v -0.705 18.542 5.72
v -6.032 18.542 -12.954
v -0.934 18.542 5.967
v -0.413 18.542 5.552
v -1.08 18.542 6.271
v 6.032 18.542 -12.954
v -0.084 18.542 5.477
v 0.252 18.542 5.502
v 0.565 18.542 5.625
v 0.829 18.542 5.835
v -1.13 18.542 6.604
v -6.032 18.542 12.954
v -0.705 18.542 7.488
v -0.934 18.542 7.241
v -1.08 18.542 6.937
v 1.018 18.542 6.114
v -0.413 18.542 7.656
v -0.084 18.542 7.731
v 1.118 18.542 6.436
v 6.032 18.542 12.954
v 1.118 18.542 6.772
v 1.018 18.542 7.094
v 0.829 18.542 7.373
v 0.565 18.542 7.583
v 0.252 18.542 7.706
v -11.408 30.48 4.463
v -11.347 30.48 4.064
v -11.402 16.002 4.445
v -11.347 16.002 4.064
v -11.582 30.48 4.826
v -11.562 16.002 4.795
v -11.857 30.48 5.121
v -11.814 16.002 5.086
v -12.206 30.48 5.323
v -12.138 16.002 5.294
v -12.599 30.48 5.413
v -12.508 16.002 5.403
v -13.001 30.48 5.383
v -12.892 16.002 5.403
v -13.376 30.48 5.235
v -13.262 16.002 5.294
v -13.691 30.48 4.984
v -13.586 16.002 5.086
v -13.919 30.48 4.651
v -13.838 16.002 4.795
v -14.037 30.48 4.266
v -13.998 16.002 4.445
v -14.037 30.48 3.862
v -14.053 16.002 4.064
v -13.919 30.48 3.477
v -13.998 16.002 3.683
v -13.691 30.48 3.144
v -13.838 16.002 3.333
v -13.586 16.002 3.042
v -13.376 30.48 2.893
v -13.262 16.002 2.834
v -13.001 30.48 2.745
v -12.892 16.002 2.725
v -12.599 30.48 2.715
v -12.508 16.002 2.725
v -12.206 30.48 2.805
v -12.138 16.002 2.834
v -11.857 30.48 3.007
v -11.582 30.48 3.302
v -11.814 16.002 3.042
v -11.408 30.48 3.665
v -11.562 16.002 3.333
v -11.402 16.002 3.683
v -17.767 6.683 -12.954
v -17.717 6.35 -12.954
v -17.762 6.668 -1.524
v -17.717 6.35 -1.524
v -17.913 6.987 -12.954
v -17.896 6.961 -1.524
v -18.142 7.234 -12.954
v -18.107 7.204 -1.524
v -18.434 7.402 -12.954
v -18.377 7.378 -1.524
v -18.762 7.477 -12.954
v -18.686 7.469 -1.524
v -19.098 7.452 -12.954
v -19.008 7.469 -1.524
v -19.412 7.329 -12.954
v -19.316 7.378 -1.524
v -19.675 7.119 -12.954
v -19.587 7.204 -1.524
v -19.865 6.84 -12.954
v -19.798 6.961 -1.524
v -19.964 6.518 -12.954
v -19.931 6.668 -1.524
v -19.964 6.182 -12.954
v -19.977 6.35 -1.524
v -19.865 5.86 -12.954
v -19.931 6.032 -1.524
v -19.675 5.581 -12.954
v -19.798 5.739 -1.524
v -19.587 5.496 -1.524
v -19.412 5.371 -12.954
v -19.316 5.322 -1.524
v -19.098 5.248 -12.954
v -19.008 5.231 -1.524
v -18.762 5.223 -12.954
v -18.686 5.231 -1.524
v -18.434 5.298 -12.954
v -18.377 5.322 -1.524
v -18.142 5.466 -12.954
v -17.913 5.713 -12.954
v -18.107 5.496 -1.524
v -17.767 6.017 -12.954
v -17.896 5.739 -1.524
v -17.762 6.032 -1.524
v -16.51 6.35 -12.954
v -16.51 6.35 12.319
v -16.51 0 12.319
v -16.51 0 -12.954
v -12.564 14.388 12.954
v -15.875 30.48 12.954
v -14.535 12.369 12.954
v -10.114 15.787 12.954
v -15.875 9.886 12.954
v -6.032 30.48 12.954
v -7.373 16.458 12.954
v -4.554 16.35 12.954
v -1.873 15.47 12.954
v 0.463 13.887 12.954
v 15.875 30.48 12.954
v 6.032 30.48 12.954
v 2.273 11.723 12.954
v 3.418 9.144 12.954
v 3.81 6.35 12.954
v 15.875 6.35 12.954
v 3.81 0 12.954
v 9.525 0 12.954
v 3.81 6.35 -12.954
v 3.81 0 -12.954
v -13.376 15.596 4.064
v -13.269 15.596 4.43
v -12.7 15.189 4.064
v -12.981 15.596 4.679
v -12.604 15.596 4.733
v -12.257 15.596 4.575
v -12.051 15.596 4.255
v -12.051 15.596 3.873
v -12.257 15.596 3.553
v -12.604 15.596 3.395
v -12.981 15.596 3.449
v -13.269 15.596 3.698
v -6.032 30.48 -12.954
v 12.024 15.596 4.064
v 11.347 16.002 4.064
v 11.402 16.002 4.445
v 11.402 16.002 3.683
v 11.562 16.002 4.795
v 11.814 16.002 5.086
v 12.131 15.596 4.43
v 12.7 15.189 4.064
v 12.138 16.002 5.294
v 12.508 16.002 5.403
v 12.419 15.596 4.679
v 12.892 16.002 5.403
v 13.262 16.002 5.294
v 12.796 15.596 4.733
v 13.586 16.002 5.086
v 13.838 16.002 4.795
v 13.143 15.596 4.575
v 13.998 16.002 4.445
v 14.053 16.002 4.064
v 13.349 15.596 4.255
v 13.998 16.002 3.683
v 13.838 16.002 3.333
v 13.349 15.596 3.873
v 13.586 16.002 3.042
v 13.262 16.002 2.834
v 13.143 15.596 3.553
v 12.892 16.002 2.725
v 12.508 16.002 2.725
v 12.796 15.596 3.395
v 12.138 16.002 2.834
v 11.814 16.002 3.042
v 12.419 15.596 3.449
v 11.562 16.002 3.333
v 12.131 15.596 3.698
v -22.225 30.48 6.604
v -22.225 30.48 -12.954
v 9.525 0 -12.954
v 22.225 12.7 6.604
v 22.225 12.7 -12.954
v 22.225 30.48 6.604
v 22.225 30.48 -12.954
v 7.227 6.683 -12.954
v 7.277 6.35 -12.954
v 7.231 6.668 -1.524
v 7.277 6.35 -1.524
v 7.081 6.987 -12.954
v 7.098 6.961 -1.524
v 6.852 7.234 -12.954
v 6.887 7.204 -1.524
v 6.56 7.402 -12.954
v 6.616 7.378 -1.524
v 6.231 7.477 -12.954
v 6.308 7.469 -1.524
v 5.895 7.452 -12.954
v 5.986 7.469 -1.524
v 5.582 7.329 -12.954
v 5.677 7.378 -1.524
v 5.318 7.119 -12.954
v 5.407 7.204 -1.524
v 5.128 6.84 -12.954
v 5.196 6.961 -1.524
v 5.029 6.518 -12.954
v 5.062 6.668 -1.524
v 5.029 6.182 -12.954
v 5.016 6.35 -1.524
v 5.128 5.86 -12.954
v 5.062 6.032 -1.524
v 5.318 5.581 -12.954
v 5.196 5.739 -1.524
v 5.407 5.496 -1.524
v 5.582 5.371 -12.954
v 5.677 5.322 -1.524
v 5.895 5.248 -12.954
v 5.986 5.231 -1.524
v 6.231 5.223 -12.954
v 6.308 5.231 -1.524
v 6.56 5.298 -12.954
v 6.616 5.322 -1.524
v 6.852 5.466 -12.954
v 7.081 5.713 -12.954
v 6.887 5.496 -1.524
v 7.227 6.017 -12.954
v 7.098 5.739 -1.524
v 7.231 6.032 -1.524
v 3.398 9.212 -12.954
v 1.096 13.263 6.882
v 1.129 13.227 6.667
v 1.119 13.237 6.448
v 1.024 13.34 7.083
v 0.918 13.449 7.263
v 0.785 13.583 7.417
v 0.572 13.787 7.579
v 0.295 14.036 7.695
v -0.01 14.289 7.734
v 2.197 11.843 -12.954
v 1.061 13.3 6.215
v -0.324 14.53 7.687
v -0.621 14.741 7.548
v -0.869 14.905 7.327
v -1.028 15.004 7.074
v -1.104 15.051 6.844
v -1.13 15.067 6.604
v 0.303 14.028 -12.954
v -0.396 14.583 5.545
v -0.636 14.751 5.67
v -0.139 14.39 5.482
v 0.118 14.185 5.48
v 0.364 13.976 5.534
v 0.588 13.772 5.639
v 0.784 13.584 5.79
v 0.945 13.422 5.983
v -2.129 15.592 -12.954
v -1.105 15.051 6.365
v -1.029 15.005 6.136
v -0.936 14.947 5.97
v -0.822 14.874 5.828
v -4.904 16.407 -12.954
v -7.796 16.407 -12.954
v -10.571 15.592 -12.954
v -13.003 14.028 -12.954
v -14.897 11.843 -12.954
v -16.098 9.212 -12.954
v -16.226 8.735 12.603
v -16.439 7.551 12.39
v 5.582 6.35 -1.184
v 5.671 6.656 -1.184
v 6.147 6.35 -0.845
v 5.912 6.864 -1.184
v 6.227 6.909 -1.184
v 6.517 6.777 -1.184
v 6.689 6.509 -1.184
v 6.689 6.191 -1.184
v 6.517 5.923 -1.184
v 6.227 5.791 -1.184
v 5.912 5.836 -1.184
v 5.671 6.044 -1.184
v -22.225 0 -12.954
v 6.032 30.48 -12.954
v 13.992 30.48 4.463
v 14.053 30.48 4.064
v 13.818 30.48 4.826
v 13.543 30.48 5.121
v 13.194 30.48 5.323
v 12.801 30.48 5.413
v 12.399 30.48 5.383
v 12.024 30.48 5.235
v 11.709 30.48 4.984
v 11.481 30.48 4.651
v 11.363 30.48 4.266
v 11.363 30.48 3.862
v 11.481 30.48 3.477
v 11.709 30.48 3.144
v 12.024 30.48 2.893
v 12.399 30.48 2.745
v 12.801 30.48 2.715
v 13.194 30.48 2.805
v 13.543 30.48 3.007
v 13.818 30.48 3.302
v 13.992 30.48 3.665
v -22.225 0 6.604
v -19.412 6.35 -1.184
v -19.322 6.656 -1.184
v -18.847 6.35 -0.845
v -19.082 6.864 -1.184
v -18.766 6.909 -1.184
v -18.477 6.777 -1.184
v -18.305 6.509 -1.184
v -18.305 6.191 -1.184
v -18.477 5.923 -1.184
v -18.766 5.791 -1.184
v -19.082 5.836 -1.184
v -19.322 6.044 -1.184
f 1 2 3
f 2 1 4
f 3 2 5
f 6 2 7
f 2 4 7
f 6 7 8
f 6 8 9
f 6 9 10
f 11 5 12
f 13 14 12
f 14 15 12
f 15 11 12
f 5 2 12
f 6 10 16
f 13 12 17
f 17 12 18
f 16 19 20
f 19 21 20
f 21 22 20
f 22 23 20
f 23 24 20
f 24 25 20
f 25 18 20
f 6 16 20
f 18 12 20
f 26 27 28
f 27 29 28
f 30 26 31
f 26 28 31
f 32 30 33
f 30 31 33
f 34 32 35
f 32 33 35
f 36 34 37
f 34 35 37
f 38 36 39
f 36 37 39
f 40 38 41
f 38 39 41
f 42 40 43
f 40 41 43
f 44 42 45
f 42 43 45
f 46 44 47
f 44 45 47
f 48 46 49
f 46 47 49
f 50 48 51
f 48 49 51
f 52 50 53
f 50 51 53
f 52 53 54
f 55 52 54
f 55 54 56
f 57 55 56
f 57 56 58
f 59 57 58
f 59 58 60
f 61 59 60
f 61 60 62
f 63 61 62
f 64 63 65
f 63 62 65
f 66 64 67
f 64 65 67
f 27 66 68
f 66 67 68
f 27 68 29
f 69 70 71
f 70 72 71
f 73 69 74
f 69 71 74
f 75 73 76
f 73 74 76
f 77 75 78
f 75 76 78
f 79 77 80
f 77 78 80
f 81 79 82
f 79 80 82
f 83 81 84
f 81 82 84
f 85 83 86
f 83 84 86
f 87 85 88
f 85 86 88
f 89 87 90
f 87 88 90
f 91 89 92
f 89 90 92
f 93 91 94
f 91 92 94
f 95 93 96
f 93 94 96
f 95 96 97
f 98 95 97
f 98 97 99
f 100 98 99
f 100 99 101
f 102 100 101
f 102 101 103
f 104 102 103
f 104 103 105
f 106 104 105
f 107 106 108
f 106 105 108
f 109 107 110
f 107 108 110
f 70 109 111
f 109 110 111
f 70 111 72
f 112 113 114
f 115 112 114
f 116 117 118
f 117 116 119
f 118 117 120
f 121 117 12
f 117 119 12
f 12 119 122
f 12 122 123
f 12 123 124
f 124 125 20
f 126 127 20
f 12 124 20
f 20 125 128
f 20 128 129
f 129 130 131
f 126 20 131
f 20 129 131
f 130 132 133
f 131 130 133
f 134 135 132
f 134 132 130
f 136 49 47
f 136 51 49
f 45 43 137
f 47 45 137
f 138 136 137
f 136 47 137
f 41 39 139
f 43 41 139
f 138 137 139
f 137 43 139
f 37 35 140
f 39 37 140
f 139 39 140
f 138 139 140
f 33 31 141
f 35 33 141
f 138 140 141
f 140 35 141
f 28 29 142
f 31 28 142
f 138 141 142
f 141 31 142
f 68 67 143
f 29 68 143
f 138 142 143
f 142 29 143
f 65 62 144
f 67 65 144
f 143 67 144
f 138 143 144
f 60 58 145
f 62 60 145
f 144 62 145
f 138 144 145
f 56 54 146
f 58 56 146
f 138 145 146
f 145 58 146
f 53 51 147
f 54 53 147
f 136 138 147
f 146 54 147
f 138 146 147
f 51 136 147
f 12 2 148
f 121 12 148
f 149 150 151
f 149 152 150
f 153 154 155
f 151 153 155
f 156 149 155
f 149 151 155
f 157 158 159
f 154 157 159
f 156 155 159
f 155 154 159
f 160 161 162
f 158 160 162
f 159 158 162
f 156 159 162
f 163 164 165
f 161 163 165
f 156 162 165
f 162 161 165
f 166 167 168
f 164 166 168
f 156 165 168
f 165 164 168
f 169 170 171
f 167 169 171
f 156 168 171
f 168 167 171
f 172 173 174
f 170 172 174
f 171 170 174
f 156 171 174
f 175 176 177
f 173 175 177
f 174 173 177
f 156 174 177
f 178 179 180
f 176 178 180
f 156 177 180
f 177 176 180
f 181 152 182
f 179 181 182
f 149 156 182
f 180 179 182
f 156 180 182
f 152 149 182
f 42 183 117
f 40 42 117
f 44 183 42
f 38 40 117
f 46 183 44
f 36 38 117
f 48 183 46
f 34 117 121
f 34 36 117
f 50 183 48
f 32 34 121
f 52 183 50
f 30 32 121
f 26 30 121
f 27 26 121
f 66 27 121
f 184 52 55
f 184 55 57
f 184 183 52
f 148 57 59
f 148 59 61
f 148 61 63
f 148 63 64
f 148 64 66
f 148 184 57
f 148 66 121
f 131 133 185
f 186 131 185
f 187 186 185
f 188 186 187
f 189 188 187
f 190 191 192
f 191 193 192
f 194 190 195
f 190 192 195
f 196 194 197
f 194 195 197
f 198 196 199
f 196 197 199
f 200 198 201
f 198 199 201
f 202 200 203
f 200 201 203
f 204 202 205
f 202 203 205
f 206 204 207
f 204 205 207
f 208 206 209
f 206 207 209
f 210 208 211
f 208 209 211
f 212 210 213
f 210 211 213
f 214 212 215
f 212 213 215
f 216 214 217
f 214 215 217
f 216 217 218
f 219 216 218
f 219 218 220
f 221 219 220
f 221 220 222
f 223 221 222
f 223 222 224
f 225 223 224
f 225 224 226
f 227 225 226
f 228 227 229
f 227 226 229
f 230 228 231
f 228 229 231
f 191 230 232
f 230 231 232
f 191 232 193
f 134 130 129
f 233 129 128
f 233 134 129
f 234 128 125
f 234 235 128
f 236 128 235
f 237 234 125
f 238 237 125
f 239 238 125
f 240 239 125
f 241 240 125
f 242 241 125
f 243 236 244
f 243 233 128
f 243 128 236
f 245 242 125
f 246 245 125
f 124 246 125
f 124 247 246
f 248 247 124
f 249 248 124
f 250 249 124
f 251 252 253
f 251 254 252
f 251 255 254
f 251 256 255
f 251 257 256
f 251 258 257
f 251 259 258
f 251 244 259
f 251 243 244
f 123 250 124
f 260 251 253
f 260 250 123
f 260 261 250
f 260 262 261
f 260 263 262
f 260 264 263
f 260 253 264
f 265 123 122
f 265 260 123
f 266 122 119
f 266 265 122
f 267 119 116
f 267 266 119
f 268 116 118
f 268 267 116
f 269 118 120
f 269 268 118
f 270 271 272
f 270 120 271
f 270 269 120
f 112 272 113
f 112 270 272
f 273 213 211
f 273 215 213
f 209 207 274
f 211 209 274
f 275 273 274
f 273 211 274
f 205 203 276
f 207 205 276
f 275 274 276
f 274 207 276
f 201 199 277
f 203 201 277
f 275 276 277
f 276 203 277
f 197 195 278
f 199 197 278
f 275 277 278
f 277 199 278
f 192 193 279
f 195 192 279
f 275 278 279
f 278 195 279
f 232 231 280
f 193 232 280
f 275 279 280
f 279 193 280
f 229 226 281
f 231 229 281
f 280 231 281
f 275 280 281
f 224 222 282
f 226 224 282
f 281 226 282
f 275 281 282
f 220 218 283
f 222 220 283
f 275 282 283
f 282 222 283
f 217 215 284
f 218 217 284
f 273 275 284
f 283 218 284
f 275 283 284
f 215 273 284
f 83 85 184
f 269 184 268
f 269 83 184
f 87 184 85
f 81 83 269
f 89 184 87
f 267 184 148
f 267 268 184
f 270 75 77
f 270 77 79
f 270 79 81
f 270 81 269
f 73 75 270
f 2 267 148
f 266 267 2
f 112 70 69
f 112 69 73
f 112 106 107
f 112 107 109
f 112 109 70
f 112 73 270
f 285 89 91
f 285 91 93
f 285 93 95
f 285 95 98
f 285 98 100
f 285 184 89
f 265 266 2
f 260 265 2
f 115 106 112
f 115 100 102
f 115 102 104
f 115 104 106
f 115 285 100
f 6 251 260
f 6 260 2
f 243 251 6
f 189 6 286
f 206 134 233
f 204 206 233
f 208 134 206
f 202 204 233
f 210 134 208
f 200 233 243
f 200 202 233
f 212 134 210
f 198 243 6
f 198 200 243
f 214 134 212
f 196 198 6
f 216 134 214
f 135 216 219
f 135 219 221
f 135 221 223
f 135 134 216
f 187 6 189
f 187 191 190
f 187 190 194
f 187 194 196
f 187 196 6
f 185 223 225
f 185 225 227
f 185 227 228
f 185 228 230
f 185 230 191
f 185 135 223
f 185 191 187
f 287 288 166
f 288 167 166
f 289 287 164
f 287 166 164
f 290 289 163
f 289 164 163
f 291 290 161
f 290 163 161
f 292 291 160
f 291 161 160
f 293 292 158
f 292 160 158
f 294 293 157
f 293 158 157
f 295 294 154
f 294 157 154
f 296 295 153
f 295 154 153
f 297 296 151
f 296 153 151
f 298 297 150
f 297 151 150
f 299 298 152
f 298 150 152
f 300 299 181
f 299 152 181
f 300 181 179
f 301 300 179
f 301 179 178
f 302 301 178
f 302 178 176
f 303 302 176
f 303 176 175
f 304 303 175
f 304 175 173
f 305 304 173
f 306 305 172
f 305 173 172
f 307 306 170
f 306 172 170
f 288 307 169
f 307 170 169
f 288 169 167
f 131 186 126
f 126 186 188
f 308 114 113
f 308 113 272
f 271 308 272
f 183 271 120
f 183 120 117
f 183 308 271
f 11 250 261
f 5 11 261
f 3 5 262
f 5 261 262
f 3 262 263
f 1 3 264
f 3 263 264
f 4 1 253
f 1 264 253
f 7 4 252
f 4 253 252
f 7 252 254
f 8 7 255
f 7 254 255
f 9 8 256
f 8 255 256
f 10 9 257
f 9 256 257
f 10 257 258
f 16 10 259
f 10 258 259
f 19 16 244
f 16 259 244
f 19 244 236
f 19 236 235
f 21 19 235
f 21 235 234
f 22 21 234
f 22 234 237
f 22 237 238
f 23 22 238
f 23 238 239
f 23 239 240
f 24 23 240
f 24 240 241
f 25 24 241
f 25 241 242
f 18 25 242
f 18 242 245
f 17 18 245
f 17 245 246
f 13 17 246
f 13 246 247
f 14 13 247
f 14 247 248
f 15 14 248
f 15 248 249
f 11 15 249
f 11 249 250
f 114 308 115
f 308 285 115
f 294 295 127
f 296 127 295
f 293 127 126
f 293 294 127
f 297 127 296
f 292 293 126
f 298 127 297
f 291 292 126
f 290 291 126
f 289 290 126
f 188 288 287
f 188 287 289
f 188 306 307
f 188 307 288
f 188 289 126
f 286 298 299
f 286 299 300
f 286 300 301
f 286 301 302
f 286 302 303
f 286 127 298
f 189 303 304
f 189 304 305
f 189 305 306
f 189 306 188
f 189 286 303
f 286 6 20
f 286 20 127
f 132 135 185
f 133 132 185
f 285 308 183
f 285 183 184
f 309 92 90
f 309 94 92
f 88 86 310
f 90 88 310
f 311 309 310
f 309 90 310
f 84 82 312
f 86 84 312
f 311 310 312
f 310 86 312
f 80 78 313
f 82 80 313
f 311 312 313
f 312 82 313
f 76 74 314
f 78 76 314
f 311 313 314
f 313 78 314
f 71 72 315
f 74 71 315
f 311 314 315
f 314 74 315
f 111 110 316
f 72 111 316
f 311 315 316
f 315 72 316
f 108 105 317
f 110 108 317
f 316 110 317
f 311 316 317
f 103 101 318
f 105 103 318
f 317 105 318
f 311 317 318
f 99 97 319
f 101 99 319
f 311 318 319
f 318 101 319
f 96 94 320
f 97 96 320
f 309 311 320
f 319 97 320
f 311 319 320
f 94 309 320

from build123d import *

# Parameters (mm, degrees)
SKETCH1_W                 = 44.45
SKETCH1_H                 = 25.908
BOSS_EXTRUDE1_DEPTH       = 30.48
SIDECHAMFER_SIZE          = 12.7
BACKCHAMFERS_SIZE         = 6.35
SKETCH2_W                 = 12.065
SKETCH2_H                 = 11.938
LINACTSLOT_DEPTH          = 46.762489978
MOUTINGHOLES_D            = 2.7051
MOUTINGHOLES_DEPTH        = 14.478
MOUTINGHOLES_TIP          = 0.81269403
CUT_EXTRUDE1_DEPTH        = 46.762489978
MOTORMOUNTINGHOLES2_D     = 2.2606
MOTORMOUNTINGHOLES2_DEPTH = 11.43
MOTORMOUNTINGHOLES2_TIP   = 0.679152758
GRIPPERSETSCREW_D         = 2.2606


with BuildPart() as part:
    # Sketch1 → Boss-Extrude1 (new body)
    with BuildSketch(Plane(origin=(0, 0, 0), x_dir=(1, 0, 0), z_dir=(0, 1, 0))):
        Rectangle(SKETCH1_W, SKETCH1_H)
    extrude(amount=BOSS_EXTRUDE1_DEPTH)

    # SideChamfer
    sidechamfer_edges = [part.edges().sort_by_distance(p)[0] for p in [
        (22.225, 0, 0),
    ]]
    chamfer(sidechamfer_edges, length=SIDECHAMFER_SIZE)

    # BackChamfers
    backchamfers_edges = [part.edges().sort_by_distance(p)[0] for p in [
        (22.225, 21.59, 12.954),
        (-22.225, 15.24, 12.954),
    ]]
    chamfer(backchamfers_edges, length=BACKCHAMFERS_SIZE)

    # Sketch2 → LinActSlot (cut, through all)
    with BuildSketch(Plane.XY.offset(12.954)):
        with Locations((0, 24.511)):
            Rectangle(SKETCH2_W, SKETCH2_H)
    extrude(amount=-LINACTSLOT_DEPTH, mode=Mode.SUBTRACT)

    # MoutingHoles
    with Locations(Plane(origin=(14.160350453, 30.48, 8.373414988), x_dir=(-1, 0, 0), z_dir=(0, 1, 0))):
        with Locations((1.460350453, -4.309414988), (26.860350453, -4.309414988)):
            Hole(MOUTINGHOLES_D / 2, depth=MOUTINGHOLES_DEPTH)
            with Locations((0, 0, -(MOUTINGHOLES_DEPTH + MOUTINGHOLES_TIP / 2))):  # 118° drill point
                Cone(0, MOUTINGHOLES_D / 2, MOUTINGHOLES_TIP, mode=Mode.SUBTRACT)

    # Sketch11 → Cut-Extrude1 (cut, through all)
    with BuildSketch(Plane(origin=(0, 0, -12.954), x_dir=(-1, 0, 0), z_dir=(0, 0, -1))):
        with BuildLine():
            Line((16.51, 6.35), (16.51, 0))
            Line((16.51, 0), (-3.81, 0))
            Line((-3.81, 0), (-3.81, 6.35))
            ThreePointArc((-3.81, 6.35), (6.35, 16.51), (16.51, 6.35))
        make_face()
    extrude(amount=-CUT_EXTRUDE1_DEPTH, mode=Mode.SUBTRACT)

    # MotorMountingHoles2
    with Locations(Plane(origin=(0, 0, -12.954), x_dir=(-1, 0, 0), z_dir=(0, 0, -1))):
        with Locations((18.8468, 6.35), (-6.1468, 6.35)):
            Hole(MOTORMOUNTINGHOLES2_D / 2, depth=MOTORMOUNTINGHOLES2_DEPTH)
            with Locations((0, 0, -(MOTORMOUNTINGHOLES2_DEPTH + MOTORMOUNTINGHOLES2_TIP / 2))):  # 118° drill point
                Cone(0, MOTORMOUNTINGHOLES2_D / 2, MOTORMOUNTINGHOLES2_TIP, mode=Mode.SUBTRACT)

    # GripperSetScrew (through all)
    with Locations(Plane(origin=(0, 18.542, 0), x_dir=(1, 0, 0), z_dir=(0, 1, 0))):
        with Locations((0, -6.604)):
            Hole(GRIPPERSETSCREW_D / 2)


solid = part.part
